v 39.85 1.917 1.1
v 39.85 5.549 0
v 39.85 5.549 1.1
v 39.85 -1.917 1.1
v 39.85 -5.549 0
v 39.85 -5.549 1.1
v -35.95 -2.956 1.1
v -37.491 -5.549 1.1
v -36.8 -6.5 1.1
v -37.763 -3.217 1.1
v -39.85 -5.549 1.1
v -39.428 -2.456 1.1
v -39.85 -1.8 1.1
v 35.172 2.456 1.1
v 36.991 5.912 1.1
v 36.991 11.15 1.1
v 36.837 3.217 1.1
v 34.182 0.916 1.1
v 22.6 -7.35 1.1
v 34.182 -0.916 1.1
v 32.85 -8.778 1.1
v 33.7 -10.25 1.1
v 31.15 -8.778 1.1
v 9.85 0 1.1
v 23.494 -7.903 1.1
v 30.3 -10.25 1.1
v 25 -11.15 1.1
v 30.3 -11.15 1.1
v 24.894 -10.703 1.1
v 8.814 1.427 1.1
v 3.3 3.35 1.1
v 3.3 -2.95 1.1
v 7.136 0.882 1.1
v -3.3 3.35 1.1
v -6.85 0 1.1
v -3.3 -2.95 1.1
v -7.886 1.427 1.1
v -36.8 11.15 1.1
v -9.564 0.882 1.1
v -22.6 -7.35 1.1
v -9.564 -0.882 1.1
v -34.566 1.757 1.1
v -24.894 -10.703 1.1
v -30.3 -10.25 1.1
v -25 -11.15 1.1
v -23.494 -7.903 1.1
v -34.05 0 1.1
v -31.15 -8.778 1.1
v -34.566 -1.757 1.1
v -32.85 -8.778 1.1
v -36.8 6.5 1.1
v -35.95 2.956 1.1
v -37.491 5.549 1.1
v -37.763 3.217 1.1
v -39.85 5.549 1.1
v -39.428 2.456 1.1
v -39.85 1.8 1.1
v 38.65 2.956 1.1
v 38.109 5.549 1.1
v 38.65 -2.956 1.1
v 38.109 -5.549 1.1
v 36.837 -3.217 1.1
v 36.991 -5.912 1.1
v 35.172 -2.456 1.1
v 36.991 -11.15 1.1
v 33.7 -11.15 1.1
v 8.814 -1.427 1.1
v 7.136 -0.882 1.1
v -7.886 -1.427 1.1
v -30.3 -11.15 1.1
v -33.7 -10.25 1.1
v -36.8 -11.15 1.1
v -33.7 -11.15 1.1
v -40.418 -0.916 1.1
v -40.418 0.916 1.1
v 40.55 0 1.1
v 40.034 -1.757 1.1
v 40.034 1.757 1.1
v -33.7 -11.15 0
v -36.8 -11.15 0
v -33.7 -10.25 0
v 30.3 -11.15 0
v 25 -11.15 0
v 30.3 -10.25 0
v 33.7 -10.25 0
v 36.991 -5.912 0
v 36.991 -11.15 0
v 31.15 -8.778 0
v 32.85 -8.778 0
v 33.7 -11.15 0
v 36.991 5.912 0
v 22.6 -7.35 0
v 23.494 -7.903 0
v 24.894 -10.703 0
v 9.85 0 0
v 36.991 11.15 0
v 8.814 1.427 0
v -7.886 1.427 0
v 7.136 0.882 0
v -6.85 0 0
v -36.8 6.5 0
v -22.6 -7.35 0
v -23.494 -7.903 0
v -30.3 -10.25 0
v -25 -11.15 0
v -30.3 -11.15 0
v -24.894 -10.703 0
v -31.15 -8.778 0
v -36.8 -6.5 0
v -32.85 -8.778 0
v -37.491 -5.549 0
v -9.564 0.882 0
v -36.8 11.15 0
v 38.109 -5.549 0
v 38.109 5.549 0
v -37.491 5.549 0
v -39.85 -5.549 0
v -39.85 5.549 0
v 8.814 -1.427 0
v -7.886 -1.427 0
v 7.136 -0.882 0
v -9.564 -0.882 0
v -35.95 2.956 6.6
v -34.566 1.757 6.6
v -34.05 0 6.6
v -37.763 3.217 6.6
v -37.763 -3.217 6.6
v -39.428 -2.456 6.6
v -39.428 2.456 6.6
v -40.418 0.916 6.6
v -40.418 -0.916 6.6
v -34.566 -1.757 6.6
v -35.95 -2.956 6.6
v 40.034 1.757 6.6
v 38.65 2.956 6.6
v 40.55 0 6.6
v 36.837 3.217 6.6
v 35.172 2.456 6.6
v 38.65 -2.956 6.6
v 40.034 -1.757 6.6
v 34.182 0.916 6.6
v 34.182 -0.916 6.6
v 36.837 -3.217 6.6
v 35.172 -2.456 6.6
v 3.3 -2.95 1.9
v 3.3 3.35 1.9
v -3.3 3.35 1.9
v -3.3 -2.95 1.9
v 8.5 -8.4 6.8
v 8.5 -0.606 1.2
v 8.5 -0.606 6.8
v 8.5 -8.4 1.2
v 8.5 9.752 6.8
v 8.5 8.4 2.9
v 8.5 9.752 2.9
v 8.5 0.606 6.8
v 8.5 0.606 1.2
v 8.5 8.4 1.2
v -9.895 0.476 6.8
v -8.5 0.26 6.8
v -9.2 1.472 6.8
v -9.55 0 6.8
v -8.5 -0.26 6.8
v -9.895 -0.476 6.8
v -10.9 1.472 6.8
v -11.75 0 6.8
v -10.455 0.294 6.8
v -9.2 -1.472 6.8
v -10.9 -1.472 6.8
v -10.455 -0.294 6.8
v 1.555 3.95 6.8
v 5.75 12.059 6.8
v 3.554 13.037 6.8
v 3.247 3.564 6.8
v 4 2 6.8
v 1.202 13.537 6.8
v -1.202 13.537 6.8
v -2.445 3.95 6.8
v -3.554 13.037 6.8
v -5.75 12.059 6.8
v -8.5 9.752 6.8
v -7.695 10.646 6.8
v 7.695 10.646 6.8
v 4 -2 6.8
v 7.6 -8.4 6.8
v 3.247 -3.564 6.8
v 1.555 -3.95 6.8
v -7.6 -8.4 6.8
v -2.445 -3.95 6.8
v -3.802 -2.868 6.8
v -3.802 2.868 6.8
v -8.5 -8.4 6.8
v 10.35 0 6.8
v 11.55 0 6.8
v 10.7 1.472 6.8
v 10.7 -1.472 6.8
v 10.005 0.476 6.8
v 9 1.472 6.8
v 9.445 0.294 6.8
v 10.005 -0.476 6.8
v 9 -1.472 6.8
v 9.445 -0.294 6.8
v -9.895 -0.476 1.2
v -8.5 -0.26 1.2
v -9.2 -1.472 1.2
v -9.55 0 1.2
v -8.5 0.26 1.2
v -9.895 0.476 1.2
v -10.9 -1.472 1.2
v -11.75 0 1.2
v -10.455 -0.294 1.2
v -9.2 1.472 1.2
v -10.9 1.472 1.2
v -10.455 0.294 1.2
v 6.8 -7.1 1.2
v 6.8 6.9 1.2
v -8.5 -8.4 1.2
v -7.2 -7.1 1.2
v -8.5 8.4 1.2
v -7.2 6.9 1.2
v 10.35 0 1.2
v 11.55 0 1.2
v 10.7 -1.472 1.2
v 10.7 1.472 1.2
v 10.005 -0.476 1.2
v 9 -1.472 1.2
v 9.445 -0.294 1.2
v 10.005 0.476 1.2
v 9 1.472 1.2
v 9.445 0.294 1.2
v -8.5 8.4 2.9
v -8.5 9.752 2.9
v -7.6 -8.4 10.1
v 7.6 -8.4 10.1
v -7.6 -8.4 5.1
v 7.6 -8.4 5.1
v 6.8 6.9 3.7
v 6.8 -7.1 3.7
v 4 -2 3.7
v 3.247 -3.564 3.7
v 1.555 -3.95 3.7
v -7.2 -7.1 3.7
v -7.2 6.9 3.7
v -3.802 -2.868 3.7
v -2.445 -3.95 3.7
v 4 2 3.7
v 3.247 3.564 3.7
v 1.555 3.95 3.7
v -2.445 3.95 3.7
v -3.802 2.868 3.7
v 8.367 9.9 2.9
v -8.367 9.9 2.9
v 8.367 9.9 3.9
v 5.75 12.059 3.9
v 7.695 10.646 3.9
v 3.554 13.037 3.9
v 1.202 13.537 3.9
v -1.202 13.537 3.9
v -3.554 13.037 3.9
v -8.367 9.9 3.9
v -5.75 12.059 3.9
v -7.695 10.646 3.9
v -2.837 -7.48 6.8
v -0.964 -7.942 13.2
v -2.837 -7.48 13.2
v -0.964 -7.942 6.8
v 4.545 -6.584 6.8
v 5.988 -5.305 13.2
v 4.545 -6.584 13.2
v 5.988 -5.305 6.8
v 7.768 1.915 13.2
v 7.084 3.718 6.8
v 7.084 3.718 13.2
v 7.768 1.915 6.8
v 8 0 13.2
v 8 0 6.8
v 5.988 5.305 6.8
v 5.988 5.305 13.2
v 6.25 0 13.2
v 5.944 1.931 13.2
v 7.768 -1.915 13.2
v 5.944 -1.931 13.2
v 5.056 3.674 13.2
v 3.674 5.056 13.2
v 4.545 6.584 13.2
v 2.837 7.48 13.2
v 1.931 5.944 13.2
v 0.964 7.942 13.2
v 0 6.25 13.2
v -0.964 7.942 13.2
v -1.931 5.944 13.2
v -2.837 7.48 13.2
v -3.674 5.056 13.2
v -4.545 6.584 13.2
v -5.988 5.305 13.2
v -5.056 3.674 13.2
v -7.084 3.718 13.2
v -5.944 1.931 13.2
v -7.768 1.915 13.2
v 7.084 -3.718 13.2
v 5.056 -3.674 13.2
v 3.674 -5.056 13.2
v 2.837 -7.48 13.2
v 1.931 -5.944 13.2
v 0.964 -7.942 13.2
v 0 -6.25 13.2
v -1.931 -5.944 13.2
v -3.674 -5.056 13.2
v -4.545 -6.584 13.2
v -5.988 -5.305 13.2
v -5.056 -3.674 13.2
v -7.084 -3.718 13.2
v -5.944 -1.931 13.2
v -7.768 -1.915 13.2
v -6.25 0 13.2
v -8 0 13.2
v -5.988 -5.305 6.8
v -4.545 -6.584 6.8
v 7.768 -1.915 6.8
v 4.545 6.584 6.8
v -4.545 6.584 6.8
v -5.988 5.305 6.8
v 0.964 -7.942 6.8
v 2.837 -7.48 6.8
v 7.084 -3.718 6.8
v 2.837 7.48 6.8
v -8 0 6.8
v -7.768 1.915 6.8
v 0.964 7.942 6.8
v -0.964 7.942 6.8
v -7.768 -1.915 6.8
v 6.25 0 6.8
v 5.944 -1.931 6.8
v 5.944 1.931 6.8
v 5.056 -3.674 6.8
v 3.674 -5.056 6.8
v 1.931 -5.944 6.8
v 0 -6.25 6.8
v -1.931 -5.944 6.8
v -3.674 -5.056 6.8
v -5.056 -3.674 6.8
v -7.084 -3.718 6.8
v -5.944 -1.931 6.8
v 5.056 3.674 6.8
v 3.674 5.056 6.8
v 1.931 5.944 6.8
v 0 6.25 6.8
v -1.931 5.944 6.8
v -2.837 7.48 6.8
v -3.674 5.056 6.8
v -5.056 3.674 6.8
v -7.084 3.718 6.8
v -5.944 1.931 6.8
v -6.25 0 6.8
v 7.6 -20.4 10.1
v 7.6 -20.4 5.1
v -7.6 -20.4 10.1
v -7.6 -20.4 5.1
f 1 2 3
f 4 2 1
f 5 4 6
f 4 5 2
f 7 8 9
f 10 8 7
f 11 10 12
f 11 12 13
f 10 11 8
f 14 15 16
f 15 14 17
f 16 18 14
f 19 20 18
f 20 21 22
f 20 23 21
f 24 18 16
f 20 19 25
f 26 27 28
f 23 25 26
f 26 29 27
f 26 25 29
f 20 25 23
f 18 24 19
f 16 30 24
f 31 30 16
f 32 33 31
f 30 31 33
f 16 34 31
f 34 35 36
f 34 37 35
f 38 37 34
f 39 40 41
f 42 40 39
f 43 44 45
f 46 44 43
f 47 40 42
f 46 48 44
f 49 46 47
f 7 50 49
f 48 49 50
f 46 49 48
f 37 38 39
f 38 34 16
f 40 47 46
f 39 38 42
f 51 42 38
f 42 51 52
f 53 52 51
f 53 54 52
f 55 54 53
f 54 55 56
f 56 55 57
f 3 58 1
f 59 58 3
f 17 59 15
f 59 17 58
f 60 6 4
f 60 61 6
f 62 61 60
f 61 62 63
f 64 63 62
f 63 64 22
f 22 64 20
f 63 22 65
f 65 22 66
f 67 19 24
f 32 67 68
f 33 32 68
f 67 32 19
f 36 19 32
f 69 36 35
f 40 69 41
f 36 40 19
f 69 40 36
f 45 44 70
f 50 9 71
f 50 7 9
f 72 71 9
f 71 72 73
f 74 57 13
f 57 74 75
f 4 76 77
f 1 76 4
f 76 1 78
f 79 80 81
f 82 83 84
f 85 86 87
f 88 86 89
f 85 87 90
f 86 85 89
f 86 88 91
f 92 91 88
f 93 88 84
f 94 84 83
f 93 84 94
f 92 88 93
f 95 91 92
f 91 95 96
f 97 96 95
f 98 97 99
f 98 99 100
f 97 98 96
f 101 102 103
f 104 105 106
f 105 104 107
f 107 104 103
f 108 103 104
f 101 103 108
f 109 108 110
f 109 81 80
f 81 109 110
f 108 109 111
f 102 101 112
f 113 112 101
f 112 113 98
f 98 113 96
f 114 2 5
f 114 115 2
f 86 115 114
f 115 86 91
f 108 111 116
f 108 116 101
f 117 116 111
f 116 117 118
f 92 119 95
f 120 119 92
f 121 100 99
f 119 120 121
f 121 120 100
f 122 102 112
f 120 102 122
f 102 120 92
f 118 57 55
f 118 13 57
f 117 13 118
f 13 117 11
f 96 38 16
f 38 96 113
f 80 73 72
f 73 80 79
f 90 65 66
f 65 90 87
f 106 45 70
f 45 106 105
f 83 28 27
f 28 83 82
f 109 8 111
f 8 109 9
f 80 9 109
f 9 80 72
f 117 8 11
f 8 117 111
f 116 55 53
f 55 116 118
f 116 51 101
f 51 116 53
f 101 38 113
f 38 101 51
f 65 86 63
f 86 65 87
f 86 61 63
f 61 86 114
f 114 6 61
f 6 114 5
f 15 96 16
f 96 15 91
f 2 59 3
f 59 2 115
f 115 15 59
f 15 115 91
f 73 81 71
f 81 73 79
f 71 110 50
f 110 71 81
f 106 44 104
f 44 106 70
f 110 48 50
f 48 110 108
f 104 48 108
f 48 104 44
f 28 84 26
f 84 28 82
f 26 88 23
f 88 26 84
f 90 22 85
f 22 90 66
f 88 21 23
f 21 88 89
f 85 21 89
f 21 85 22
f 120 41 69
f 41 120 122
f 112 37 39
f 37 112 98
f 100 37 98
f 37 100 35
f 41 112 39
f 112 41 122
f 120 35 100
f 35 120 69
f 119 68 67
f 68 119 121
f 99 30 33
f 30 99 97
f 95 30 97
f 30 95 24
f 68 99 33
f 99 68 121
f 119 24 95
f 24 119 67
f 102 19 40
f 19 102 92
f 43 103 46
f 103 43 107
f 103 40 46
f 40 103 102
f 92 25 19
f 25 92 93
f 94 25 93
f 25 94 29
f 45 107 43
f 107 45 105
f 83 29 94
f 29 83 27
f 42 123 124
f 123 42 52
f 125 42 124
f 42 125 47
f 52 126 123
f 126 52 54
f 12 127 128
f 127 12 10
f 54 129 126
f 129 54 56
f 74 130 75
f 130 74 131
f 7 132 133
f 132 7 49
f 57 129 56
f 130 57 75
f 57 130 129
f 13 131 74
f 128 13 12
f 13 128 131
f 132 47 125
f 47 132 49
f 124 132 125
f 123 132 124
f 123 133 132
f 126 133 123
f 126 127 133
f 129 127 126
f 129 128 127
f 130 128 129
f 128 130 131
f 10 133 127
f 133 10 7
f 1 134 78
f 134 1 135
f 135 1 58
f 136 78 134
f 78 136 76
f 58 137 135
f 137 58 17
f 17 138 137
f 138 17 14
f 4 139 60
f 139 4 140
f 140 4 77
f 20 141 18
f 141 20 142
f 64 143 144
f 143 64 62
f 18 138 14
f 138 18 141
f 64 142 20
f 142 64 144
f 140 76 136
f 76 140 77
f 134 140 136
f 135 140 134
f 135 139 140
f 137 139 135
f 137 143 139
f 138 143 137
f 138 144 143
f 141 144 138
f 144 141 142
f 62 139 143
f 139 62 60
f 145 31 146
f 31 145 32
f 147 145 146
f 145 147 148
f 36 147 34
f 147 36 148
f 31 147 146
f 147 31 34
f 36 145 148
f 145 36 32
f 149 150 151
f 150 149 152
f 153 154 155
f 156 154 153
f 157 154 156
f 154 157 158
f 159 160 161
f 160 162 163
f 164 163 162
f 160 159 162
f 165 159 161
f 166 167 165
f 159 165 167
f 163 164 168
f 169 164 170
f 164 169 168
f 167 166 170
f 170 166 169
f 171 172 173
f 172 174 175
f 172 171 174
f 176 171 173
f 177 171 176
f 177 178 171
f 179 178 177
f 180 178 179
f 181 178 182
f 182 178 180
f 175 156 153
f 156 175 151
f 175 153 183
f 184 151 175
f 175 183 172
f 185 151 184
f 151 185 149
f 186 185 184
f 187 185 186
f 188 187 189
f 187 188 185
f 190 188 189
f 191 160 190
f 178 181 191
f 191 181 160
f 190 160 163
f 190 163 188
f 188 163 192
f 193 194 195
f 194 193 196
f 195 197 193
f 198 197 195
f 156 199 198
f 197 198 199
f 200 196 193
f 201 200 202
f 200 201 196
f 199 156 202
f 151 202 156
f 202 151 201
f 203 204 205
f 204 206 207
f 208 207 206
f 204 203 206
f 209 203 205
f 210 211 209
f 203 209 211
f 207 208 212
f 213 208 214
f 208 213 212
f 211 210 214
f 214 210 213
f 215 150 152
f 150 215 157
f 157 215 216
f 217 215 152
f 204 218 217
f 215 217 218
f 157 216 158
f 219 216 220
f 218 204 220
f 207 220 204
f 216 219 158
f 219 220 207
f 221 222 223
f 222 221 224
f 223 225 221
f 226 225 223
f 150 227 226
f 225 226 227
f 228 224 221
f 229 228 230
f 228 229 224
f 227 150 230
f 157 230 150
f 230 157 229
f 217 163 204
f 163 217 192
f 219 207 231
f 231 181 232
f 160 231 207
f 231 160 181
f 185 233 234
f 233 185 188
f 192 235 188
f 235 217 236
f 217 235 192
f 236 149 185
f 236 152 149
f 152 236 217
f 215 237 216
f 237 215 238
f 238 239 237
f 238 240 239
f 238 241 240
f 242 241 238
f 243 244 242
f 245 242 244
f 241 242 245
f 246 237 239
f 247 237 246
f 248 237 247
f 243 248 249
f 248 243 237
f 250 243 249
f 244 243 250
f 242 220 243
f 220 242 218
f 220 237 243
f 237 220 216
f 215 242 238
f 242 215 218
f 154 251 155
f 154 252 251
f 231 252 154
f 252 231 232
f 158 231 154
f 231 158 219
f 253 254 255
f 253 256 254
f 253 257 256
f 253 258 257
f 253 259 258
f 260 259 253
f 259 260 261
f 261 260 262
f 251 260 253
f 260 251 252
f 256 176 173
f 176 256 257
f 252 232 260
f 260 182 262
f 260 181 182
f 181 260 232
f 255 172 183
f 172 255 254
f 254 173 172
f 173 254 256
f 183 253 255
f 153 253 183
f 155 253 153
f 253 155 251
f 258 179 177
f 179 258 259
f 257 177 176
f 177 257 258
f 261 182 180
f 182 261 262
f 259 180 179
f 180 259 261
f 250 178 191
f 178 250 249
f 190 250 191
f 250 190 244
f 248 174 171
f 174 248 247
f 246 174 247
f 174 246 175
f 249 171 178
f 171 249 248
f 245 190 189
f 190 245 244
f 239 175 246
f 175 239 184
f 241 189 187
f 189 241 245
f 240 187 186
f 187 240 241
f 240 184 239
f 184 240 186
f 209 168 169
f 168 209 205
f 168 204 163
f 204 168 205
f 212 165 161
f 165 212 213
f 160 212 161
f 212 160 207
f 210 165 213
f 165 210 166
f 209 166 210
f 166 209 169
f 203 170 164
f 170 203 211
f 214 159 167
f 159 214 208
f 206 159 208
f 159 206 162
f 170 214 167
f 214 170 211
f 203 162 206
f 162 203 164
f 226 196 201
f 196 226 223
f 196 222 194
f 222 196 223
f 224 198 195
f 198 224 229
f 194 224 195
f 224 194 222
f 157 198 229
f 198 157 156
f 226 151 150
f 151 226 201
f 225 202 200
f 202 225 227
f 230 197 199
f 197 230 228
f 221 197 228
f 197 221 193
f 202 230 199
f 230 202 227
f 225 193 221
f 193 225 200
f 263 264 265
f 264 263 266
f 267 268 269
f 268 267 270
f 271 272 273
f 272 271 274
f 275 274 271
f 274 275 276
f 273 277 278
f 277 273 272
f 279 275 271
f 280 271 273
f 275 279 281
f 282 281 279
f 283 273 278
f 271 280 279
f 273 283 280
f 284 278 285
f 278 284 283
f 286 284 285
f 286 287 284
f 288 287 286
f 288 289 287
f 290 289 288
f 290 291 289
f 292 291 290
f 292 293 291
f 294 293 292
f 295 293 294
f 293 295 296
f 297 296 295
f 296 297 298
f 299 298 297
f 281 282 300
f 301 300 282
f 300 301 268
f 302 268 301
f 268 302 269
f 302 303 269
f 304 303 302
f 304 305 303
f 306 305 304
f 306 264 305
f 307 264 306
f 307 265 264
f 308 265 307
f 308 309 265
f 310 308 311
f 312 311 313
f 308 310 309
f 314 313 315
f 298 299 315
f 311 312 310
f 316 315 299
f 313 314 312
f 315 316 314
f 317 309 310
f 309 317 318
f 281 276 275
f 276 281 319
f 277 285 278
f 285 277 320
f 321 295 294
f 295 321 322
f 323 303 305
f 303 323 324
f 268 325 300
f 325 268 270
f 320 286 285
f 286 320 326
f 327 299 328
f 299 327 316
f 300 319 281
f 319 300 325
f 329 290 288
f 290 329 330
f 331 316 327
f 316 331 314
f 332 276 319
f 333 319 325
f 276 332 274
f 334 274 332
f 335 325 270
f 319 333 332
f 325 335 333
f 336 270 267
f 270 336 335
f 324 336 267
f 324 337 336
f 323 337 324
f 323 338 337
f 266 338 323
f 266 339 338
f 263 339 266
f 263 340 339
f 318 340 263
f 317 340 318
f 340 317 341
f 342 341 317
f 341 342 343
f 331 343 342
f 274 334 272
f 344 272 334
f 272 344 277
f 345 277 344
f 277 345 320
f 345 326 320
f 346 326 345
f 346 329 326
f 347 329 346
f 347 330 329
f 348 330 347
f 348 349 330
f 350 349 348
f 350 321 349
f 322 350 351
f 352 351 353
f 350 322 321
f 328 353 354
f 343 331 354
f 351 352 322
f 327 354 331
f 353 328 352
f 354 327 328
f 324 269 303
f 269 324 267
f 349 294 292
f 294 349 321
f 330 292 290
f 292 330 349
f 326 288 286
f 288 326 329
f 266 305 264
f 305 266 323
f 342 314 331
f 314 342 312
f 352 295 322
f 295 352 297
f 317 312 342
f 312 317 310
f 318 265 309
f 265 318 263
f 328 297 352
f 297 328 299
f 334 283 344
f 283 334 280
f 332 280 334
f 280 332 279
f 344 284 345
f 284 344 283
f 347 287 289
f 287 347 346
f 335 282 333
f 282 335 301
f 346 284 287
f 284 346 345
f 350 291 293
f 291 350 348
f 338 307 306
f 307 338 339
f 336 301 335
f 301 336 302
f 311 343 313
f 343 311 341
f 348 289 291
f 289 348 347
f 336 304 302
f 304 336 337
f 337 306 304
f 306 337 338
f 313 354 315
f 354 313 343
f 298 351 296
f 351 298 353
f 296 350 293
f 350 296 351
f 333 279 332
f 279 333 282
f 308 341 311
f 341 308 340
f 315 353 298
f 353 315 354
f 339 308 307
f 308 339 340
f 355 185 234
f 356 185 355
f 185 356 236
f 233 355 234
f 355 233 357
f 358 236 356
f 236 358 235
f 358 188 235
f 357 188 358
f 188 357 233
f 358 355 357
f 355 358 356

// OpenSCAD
// file: irswitcher.scad
module irswitcher() {
  translate([-17 / 2, -16.8 / 2, 0]) {
    difference() {
      intersection() {
        difference() {
          cube([17, 22, 5.6]);
          translate([1.3, 1.3, -0.5]) cube([14, 14, 3]);
          translate([-1, 16.8, -1]) cube([17 + 2, 10, 1.7 + 1]);
          translate([-1, 16.8 + 1.5, -1]) cube([17 + 2, 10, 1.7 + 1 + 1]);
        }
        translate([17/2, 22 - 11.5, 0]) hull() {
          translate([0, 0, -2.5]) cylinder(d = 23, h = 10);
          translate([0, -10, -2.5]) cylinder(d = 23, h = 10);
        }
      }
      translate([17 / 2, 16.8 / 2, -2]) {
        hull() {
          translate([-4 + 2, -4 + 2, 0])  cylinder(r = 2, h= 20);
          translate([+4 - 2, -4 + 2, 0])  cylinder(r = 2, h= 20);
          translate([-4 + 2, +4 - 2, 0])  cylinder(r = 2, h= 20);
          translate([+4 - 2, +4 - 2, 0])  cylinder(r = 2, h= 20);
        }
      }
    }
    translate([-3.25 + (3.4 / 2), 16.8 / 2, 0]) difference() {
      cylinder(d = 3.4, h = 5.6);
      translate([0, 0, -0.1]) cylinder(d = 1.0, h = 6.6);
    }
    translate([16.8 + 3.25 - (3.4 / 2), 16.8 / 2, 0]) difference() {
      cylinder(d = 3.4, h = 5.6);
      translate([0, 0, -0.1]) cylinder(d = 1.0, h = 6.6);
    }
    translate([17 / 2, 16.8 / 2, 5.6]) difference() {
      cylinder(d = 16, h = 12 - 5.6);
      translate([0, 0, - 0.5]) cylinder(d = 12.5, h = 12 - 5.6 + 1);
    }

    translate([17 / 2 - 15.2 / 2, -12, 3.9]) cube([15.2, 12, 5]);
  }
}
// file: c920.scad
module c920() {
  $w = 79.7;
  $d = 22.3;
  $h = 1.1;
  $r1 = 1;
  $d1 = 3.4;
  $d2 = 3;

  $sensor_w = 6.6;
  $sensor_d = 6.3;
  $sensor_h = 0.8;

  translate([-$w / 2, -$d / 2, 0]) {
    color("green") difference() {
      cube([$w, $d, $h]);
      //top-left corner cutout
      translate([-$r1, -$r1, $h * -1]) minkowski() {
        cylinder(r = $r1, h = $h * 2);
        cube([($w - 73.6) / 2, ($d - 11.0) / 2, $h * 1]);
      }
      //bottom-left corner cutout
      translate([-$r1, $r1 + ($d - 11.0) / 2 + 11.0, $h * -1]) minkowski() {
        cylinder(r = $r1, h = $h * 2);
        cube([($w - 73.6) / 2, ($d - 11.0) / 2, $h * 1]);
      }
      //top-right corner cutout
      translate([$w - ($w - 73.6) / 2 + $r1, -$r1, $h * -1]) minkowski() {
        cylinder(r = $r1, h = $h * 2);
        cube([($w - 73.6) / 2, ($d - 11.0) / 2, $h * 1]);
      }
      //bottom-right corner cutout
      translate([$w - ($w - 73.6) / 2 + $r1, $r1 + ($d - 11.0) / 2 + 11.0, $h * -1]) minkowski() {
        cylinder(r = $r1, h = $h * 2);
        cube([($w - 73.6) / 2, ($d - 11.0) / 2, $h * 1]);
      }
      //bottom-left big hole cutout
      translate([($w - 73.6) / 2 + 3.1 + $d1 / 2, 0.9, $h * -1]) hull() {
        cylinder(d = $d1, h = $h * 3);
        translate([0, -2, 0]) cylinder(d = $d1, h = $h * 3);
      }
      //bottom-right big hole cutout
      translate([$w - ($w - 73.6) / 2 - 3.1 - $d1 / 2, 0.9, $h * -1]) hull() {
        cylinder(d = $d1, h = $h * 3);
        translate([0, -2, 0]) cylinder(d = $d1, h = $h * 3);
      }
      // left sensor hole
      translate([31.5, $d / 2, $h * -1]) cylinder(d = $d2, h = $h * 3);
      // right sensor hole
      translate([$w - 31.5, $d / 2, $h * -1]) cylinder(d = $d2, h = $h * 3);
      // bottom cutout
      translate([$w / 2 - 50 / 2, 0, $h * -1]) linear_extrude(height = $h * 3) offset(r=1) hull() {
        translate([(50 - 46.7 + 1.5) / 2, 1, 0]) square(size = [46.7 - 1.5, 3.8 - 2]);
        translate([1, -2.0, 0]) square(size = [50.0 - 2, 0.5 * 4]);
      }
    }


    // speakers
    color("silver") {
      translate([($w - 73.6) / 2 - 0.5, $d / 2, $h]) cylinder(d = 6.5, h = 5.5);
      translate([$w - ($w - 73.6) / 2 + 0.5, $d / 2, $h]) cylinder(d = 6.5, h = 5.5);
    }

    translate([$w / 2 - $sensor_w / 2, $d - 18.5 + 4.4, $h]) cube([$sensor_w, $sensor_d, $sensor_h]);
  }
}
// main file
include <c920.scad>;
include <irswitcher.scad>;

c920();
translate([0, 0, 1.1 + 0.1]) irswitcher();
